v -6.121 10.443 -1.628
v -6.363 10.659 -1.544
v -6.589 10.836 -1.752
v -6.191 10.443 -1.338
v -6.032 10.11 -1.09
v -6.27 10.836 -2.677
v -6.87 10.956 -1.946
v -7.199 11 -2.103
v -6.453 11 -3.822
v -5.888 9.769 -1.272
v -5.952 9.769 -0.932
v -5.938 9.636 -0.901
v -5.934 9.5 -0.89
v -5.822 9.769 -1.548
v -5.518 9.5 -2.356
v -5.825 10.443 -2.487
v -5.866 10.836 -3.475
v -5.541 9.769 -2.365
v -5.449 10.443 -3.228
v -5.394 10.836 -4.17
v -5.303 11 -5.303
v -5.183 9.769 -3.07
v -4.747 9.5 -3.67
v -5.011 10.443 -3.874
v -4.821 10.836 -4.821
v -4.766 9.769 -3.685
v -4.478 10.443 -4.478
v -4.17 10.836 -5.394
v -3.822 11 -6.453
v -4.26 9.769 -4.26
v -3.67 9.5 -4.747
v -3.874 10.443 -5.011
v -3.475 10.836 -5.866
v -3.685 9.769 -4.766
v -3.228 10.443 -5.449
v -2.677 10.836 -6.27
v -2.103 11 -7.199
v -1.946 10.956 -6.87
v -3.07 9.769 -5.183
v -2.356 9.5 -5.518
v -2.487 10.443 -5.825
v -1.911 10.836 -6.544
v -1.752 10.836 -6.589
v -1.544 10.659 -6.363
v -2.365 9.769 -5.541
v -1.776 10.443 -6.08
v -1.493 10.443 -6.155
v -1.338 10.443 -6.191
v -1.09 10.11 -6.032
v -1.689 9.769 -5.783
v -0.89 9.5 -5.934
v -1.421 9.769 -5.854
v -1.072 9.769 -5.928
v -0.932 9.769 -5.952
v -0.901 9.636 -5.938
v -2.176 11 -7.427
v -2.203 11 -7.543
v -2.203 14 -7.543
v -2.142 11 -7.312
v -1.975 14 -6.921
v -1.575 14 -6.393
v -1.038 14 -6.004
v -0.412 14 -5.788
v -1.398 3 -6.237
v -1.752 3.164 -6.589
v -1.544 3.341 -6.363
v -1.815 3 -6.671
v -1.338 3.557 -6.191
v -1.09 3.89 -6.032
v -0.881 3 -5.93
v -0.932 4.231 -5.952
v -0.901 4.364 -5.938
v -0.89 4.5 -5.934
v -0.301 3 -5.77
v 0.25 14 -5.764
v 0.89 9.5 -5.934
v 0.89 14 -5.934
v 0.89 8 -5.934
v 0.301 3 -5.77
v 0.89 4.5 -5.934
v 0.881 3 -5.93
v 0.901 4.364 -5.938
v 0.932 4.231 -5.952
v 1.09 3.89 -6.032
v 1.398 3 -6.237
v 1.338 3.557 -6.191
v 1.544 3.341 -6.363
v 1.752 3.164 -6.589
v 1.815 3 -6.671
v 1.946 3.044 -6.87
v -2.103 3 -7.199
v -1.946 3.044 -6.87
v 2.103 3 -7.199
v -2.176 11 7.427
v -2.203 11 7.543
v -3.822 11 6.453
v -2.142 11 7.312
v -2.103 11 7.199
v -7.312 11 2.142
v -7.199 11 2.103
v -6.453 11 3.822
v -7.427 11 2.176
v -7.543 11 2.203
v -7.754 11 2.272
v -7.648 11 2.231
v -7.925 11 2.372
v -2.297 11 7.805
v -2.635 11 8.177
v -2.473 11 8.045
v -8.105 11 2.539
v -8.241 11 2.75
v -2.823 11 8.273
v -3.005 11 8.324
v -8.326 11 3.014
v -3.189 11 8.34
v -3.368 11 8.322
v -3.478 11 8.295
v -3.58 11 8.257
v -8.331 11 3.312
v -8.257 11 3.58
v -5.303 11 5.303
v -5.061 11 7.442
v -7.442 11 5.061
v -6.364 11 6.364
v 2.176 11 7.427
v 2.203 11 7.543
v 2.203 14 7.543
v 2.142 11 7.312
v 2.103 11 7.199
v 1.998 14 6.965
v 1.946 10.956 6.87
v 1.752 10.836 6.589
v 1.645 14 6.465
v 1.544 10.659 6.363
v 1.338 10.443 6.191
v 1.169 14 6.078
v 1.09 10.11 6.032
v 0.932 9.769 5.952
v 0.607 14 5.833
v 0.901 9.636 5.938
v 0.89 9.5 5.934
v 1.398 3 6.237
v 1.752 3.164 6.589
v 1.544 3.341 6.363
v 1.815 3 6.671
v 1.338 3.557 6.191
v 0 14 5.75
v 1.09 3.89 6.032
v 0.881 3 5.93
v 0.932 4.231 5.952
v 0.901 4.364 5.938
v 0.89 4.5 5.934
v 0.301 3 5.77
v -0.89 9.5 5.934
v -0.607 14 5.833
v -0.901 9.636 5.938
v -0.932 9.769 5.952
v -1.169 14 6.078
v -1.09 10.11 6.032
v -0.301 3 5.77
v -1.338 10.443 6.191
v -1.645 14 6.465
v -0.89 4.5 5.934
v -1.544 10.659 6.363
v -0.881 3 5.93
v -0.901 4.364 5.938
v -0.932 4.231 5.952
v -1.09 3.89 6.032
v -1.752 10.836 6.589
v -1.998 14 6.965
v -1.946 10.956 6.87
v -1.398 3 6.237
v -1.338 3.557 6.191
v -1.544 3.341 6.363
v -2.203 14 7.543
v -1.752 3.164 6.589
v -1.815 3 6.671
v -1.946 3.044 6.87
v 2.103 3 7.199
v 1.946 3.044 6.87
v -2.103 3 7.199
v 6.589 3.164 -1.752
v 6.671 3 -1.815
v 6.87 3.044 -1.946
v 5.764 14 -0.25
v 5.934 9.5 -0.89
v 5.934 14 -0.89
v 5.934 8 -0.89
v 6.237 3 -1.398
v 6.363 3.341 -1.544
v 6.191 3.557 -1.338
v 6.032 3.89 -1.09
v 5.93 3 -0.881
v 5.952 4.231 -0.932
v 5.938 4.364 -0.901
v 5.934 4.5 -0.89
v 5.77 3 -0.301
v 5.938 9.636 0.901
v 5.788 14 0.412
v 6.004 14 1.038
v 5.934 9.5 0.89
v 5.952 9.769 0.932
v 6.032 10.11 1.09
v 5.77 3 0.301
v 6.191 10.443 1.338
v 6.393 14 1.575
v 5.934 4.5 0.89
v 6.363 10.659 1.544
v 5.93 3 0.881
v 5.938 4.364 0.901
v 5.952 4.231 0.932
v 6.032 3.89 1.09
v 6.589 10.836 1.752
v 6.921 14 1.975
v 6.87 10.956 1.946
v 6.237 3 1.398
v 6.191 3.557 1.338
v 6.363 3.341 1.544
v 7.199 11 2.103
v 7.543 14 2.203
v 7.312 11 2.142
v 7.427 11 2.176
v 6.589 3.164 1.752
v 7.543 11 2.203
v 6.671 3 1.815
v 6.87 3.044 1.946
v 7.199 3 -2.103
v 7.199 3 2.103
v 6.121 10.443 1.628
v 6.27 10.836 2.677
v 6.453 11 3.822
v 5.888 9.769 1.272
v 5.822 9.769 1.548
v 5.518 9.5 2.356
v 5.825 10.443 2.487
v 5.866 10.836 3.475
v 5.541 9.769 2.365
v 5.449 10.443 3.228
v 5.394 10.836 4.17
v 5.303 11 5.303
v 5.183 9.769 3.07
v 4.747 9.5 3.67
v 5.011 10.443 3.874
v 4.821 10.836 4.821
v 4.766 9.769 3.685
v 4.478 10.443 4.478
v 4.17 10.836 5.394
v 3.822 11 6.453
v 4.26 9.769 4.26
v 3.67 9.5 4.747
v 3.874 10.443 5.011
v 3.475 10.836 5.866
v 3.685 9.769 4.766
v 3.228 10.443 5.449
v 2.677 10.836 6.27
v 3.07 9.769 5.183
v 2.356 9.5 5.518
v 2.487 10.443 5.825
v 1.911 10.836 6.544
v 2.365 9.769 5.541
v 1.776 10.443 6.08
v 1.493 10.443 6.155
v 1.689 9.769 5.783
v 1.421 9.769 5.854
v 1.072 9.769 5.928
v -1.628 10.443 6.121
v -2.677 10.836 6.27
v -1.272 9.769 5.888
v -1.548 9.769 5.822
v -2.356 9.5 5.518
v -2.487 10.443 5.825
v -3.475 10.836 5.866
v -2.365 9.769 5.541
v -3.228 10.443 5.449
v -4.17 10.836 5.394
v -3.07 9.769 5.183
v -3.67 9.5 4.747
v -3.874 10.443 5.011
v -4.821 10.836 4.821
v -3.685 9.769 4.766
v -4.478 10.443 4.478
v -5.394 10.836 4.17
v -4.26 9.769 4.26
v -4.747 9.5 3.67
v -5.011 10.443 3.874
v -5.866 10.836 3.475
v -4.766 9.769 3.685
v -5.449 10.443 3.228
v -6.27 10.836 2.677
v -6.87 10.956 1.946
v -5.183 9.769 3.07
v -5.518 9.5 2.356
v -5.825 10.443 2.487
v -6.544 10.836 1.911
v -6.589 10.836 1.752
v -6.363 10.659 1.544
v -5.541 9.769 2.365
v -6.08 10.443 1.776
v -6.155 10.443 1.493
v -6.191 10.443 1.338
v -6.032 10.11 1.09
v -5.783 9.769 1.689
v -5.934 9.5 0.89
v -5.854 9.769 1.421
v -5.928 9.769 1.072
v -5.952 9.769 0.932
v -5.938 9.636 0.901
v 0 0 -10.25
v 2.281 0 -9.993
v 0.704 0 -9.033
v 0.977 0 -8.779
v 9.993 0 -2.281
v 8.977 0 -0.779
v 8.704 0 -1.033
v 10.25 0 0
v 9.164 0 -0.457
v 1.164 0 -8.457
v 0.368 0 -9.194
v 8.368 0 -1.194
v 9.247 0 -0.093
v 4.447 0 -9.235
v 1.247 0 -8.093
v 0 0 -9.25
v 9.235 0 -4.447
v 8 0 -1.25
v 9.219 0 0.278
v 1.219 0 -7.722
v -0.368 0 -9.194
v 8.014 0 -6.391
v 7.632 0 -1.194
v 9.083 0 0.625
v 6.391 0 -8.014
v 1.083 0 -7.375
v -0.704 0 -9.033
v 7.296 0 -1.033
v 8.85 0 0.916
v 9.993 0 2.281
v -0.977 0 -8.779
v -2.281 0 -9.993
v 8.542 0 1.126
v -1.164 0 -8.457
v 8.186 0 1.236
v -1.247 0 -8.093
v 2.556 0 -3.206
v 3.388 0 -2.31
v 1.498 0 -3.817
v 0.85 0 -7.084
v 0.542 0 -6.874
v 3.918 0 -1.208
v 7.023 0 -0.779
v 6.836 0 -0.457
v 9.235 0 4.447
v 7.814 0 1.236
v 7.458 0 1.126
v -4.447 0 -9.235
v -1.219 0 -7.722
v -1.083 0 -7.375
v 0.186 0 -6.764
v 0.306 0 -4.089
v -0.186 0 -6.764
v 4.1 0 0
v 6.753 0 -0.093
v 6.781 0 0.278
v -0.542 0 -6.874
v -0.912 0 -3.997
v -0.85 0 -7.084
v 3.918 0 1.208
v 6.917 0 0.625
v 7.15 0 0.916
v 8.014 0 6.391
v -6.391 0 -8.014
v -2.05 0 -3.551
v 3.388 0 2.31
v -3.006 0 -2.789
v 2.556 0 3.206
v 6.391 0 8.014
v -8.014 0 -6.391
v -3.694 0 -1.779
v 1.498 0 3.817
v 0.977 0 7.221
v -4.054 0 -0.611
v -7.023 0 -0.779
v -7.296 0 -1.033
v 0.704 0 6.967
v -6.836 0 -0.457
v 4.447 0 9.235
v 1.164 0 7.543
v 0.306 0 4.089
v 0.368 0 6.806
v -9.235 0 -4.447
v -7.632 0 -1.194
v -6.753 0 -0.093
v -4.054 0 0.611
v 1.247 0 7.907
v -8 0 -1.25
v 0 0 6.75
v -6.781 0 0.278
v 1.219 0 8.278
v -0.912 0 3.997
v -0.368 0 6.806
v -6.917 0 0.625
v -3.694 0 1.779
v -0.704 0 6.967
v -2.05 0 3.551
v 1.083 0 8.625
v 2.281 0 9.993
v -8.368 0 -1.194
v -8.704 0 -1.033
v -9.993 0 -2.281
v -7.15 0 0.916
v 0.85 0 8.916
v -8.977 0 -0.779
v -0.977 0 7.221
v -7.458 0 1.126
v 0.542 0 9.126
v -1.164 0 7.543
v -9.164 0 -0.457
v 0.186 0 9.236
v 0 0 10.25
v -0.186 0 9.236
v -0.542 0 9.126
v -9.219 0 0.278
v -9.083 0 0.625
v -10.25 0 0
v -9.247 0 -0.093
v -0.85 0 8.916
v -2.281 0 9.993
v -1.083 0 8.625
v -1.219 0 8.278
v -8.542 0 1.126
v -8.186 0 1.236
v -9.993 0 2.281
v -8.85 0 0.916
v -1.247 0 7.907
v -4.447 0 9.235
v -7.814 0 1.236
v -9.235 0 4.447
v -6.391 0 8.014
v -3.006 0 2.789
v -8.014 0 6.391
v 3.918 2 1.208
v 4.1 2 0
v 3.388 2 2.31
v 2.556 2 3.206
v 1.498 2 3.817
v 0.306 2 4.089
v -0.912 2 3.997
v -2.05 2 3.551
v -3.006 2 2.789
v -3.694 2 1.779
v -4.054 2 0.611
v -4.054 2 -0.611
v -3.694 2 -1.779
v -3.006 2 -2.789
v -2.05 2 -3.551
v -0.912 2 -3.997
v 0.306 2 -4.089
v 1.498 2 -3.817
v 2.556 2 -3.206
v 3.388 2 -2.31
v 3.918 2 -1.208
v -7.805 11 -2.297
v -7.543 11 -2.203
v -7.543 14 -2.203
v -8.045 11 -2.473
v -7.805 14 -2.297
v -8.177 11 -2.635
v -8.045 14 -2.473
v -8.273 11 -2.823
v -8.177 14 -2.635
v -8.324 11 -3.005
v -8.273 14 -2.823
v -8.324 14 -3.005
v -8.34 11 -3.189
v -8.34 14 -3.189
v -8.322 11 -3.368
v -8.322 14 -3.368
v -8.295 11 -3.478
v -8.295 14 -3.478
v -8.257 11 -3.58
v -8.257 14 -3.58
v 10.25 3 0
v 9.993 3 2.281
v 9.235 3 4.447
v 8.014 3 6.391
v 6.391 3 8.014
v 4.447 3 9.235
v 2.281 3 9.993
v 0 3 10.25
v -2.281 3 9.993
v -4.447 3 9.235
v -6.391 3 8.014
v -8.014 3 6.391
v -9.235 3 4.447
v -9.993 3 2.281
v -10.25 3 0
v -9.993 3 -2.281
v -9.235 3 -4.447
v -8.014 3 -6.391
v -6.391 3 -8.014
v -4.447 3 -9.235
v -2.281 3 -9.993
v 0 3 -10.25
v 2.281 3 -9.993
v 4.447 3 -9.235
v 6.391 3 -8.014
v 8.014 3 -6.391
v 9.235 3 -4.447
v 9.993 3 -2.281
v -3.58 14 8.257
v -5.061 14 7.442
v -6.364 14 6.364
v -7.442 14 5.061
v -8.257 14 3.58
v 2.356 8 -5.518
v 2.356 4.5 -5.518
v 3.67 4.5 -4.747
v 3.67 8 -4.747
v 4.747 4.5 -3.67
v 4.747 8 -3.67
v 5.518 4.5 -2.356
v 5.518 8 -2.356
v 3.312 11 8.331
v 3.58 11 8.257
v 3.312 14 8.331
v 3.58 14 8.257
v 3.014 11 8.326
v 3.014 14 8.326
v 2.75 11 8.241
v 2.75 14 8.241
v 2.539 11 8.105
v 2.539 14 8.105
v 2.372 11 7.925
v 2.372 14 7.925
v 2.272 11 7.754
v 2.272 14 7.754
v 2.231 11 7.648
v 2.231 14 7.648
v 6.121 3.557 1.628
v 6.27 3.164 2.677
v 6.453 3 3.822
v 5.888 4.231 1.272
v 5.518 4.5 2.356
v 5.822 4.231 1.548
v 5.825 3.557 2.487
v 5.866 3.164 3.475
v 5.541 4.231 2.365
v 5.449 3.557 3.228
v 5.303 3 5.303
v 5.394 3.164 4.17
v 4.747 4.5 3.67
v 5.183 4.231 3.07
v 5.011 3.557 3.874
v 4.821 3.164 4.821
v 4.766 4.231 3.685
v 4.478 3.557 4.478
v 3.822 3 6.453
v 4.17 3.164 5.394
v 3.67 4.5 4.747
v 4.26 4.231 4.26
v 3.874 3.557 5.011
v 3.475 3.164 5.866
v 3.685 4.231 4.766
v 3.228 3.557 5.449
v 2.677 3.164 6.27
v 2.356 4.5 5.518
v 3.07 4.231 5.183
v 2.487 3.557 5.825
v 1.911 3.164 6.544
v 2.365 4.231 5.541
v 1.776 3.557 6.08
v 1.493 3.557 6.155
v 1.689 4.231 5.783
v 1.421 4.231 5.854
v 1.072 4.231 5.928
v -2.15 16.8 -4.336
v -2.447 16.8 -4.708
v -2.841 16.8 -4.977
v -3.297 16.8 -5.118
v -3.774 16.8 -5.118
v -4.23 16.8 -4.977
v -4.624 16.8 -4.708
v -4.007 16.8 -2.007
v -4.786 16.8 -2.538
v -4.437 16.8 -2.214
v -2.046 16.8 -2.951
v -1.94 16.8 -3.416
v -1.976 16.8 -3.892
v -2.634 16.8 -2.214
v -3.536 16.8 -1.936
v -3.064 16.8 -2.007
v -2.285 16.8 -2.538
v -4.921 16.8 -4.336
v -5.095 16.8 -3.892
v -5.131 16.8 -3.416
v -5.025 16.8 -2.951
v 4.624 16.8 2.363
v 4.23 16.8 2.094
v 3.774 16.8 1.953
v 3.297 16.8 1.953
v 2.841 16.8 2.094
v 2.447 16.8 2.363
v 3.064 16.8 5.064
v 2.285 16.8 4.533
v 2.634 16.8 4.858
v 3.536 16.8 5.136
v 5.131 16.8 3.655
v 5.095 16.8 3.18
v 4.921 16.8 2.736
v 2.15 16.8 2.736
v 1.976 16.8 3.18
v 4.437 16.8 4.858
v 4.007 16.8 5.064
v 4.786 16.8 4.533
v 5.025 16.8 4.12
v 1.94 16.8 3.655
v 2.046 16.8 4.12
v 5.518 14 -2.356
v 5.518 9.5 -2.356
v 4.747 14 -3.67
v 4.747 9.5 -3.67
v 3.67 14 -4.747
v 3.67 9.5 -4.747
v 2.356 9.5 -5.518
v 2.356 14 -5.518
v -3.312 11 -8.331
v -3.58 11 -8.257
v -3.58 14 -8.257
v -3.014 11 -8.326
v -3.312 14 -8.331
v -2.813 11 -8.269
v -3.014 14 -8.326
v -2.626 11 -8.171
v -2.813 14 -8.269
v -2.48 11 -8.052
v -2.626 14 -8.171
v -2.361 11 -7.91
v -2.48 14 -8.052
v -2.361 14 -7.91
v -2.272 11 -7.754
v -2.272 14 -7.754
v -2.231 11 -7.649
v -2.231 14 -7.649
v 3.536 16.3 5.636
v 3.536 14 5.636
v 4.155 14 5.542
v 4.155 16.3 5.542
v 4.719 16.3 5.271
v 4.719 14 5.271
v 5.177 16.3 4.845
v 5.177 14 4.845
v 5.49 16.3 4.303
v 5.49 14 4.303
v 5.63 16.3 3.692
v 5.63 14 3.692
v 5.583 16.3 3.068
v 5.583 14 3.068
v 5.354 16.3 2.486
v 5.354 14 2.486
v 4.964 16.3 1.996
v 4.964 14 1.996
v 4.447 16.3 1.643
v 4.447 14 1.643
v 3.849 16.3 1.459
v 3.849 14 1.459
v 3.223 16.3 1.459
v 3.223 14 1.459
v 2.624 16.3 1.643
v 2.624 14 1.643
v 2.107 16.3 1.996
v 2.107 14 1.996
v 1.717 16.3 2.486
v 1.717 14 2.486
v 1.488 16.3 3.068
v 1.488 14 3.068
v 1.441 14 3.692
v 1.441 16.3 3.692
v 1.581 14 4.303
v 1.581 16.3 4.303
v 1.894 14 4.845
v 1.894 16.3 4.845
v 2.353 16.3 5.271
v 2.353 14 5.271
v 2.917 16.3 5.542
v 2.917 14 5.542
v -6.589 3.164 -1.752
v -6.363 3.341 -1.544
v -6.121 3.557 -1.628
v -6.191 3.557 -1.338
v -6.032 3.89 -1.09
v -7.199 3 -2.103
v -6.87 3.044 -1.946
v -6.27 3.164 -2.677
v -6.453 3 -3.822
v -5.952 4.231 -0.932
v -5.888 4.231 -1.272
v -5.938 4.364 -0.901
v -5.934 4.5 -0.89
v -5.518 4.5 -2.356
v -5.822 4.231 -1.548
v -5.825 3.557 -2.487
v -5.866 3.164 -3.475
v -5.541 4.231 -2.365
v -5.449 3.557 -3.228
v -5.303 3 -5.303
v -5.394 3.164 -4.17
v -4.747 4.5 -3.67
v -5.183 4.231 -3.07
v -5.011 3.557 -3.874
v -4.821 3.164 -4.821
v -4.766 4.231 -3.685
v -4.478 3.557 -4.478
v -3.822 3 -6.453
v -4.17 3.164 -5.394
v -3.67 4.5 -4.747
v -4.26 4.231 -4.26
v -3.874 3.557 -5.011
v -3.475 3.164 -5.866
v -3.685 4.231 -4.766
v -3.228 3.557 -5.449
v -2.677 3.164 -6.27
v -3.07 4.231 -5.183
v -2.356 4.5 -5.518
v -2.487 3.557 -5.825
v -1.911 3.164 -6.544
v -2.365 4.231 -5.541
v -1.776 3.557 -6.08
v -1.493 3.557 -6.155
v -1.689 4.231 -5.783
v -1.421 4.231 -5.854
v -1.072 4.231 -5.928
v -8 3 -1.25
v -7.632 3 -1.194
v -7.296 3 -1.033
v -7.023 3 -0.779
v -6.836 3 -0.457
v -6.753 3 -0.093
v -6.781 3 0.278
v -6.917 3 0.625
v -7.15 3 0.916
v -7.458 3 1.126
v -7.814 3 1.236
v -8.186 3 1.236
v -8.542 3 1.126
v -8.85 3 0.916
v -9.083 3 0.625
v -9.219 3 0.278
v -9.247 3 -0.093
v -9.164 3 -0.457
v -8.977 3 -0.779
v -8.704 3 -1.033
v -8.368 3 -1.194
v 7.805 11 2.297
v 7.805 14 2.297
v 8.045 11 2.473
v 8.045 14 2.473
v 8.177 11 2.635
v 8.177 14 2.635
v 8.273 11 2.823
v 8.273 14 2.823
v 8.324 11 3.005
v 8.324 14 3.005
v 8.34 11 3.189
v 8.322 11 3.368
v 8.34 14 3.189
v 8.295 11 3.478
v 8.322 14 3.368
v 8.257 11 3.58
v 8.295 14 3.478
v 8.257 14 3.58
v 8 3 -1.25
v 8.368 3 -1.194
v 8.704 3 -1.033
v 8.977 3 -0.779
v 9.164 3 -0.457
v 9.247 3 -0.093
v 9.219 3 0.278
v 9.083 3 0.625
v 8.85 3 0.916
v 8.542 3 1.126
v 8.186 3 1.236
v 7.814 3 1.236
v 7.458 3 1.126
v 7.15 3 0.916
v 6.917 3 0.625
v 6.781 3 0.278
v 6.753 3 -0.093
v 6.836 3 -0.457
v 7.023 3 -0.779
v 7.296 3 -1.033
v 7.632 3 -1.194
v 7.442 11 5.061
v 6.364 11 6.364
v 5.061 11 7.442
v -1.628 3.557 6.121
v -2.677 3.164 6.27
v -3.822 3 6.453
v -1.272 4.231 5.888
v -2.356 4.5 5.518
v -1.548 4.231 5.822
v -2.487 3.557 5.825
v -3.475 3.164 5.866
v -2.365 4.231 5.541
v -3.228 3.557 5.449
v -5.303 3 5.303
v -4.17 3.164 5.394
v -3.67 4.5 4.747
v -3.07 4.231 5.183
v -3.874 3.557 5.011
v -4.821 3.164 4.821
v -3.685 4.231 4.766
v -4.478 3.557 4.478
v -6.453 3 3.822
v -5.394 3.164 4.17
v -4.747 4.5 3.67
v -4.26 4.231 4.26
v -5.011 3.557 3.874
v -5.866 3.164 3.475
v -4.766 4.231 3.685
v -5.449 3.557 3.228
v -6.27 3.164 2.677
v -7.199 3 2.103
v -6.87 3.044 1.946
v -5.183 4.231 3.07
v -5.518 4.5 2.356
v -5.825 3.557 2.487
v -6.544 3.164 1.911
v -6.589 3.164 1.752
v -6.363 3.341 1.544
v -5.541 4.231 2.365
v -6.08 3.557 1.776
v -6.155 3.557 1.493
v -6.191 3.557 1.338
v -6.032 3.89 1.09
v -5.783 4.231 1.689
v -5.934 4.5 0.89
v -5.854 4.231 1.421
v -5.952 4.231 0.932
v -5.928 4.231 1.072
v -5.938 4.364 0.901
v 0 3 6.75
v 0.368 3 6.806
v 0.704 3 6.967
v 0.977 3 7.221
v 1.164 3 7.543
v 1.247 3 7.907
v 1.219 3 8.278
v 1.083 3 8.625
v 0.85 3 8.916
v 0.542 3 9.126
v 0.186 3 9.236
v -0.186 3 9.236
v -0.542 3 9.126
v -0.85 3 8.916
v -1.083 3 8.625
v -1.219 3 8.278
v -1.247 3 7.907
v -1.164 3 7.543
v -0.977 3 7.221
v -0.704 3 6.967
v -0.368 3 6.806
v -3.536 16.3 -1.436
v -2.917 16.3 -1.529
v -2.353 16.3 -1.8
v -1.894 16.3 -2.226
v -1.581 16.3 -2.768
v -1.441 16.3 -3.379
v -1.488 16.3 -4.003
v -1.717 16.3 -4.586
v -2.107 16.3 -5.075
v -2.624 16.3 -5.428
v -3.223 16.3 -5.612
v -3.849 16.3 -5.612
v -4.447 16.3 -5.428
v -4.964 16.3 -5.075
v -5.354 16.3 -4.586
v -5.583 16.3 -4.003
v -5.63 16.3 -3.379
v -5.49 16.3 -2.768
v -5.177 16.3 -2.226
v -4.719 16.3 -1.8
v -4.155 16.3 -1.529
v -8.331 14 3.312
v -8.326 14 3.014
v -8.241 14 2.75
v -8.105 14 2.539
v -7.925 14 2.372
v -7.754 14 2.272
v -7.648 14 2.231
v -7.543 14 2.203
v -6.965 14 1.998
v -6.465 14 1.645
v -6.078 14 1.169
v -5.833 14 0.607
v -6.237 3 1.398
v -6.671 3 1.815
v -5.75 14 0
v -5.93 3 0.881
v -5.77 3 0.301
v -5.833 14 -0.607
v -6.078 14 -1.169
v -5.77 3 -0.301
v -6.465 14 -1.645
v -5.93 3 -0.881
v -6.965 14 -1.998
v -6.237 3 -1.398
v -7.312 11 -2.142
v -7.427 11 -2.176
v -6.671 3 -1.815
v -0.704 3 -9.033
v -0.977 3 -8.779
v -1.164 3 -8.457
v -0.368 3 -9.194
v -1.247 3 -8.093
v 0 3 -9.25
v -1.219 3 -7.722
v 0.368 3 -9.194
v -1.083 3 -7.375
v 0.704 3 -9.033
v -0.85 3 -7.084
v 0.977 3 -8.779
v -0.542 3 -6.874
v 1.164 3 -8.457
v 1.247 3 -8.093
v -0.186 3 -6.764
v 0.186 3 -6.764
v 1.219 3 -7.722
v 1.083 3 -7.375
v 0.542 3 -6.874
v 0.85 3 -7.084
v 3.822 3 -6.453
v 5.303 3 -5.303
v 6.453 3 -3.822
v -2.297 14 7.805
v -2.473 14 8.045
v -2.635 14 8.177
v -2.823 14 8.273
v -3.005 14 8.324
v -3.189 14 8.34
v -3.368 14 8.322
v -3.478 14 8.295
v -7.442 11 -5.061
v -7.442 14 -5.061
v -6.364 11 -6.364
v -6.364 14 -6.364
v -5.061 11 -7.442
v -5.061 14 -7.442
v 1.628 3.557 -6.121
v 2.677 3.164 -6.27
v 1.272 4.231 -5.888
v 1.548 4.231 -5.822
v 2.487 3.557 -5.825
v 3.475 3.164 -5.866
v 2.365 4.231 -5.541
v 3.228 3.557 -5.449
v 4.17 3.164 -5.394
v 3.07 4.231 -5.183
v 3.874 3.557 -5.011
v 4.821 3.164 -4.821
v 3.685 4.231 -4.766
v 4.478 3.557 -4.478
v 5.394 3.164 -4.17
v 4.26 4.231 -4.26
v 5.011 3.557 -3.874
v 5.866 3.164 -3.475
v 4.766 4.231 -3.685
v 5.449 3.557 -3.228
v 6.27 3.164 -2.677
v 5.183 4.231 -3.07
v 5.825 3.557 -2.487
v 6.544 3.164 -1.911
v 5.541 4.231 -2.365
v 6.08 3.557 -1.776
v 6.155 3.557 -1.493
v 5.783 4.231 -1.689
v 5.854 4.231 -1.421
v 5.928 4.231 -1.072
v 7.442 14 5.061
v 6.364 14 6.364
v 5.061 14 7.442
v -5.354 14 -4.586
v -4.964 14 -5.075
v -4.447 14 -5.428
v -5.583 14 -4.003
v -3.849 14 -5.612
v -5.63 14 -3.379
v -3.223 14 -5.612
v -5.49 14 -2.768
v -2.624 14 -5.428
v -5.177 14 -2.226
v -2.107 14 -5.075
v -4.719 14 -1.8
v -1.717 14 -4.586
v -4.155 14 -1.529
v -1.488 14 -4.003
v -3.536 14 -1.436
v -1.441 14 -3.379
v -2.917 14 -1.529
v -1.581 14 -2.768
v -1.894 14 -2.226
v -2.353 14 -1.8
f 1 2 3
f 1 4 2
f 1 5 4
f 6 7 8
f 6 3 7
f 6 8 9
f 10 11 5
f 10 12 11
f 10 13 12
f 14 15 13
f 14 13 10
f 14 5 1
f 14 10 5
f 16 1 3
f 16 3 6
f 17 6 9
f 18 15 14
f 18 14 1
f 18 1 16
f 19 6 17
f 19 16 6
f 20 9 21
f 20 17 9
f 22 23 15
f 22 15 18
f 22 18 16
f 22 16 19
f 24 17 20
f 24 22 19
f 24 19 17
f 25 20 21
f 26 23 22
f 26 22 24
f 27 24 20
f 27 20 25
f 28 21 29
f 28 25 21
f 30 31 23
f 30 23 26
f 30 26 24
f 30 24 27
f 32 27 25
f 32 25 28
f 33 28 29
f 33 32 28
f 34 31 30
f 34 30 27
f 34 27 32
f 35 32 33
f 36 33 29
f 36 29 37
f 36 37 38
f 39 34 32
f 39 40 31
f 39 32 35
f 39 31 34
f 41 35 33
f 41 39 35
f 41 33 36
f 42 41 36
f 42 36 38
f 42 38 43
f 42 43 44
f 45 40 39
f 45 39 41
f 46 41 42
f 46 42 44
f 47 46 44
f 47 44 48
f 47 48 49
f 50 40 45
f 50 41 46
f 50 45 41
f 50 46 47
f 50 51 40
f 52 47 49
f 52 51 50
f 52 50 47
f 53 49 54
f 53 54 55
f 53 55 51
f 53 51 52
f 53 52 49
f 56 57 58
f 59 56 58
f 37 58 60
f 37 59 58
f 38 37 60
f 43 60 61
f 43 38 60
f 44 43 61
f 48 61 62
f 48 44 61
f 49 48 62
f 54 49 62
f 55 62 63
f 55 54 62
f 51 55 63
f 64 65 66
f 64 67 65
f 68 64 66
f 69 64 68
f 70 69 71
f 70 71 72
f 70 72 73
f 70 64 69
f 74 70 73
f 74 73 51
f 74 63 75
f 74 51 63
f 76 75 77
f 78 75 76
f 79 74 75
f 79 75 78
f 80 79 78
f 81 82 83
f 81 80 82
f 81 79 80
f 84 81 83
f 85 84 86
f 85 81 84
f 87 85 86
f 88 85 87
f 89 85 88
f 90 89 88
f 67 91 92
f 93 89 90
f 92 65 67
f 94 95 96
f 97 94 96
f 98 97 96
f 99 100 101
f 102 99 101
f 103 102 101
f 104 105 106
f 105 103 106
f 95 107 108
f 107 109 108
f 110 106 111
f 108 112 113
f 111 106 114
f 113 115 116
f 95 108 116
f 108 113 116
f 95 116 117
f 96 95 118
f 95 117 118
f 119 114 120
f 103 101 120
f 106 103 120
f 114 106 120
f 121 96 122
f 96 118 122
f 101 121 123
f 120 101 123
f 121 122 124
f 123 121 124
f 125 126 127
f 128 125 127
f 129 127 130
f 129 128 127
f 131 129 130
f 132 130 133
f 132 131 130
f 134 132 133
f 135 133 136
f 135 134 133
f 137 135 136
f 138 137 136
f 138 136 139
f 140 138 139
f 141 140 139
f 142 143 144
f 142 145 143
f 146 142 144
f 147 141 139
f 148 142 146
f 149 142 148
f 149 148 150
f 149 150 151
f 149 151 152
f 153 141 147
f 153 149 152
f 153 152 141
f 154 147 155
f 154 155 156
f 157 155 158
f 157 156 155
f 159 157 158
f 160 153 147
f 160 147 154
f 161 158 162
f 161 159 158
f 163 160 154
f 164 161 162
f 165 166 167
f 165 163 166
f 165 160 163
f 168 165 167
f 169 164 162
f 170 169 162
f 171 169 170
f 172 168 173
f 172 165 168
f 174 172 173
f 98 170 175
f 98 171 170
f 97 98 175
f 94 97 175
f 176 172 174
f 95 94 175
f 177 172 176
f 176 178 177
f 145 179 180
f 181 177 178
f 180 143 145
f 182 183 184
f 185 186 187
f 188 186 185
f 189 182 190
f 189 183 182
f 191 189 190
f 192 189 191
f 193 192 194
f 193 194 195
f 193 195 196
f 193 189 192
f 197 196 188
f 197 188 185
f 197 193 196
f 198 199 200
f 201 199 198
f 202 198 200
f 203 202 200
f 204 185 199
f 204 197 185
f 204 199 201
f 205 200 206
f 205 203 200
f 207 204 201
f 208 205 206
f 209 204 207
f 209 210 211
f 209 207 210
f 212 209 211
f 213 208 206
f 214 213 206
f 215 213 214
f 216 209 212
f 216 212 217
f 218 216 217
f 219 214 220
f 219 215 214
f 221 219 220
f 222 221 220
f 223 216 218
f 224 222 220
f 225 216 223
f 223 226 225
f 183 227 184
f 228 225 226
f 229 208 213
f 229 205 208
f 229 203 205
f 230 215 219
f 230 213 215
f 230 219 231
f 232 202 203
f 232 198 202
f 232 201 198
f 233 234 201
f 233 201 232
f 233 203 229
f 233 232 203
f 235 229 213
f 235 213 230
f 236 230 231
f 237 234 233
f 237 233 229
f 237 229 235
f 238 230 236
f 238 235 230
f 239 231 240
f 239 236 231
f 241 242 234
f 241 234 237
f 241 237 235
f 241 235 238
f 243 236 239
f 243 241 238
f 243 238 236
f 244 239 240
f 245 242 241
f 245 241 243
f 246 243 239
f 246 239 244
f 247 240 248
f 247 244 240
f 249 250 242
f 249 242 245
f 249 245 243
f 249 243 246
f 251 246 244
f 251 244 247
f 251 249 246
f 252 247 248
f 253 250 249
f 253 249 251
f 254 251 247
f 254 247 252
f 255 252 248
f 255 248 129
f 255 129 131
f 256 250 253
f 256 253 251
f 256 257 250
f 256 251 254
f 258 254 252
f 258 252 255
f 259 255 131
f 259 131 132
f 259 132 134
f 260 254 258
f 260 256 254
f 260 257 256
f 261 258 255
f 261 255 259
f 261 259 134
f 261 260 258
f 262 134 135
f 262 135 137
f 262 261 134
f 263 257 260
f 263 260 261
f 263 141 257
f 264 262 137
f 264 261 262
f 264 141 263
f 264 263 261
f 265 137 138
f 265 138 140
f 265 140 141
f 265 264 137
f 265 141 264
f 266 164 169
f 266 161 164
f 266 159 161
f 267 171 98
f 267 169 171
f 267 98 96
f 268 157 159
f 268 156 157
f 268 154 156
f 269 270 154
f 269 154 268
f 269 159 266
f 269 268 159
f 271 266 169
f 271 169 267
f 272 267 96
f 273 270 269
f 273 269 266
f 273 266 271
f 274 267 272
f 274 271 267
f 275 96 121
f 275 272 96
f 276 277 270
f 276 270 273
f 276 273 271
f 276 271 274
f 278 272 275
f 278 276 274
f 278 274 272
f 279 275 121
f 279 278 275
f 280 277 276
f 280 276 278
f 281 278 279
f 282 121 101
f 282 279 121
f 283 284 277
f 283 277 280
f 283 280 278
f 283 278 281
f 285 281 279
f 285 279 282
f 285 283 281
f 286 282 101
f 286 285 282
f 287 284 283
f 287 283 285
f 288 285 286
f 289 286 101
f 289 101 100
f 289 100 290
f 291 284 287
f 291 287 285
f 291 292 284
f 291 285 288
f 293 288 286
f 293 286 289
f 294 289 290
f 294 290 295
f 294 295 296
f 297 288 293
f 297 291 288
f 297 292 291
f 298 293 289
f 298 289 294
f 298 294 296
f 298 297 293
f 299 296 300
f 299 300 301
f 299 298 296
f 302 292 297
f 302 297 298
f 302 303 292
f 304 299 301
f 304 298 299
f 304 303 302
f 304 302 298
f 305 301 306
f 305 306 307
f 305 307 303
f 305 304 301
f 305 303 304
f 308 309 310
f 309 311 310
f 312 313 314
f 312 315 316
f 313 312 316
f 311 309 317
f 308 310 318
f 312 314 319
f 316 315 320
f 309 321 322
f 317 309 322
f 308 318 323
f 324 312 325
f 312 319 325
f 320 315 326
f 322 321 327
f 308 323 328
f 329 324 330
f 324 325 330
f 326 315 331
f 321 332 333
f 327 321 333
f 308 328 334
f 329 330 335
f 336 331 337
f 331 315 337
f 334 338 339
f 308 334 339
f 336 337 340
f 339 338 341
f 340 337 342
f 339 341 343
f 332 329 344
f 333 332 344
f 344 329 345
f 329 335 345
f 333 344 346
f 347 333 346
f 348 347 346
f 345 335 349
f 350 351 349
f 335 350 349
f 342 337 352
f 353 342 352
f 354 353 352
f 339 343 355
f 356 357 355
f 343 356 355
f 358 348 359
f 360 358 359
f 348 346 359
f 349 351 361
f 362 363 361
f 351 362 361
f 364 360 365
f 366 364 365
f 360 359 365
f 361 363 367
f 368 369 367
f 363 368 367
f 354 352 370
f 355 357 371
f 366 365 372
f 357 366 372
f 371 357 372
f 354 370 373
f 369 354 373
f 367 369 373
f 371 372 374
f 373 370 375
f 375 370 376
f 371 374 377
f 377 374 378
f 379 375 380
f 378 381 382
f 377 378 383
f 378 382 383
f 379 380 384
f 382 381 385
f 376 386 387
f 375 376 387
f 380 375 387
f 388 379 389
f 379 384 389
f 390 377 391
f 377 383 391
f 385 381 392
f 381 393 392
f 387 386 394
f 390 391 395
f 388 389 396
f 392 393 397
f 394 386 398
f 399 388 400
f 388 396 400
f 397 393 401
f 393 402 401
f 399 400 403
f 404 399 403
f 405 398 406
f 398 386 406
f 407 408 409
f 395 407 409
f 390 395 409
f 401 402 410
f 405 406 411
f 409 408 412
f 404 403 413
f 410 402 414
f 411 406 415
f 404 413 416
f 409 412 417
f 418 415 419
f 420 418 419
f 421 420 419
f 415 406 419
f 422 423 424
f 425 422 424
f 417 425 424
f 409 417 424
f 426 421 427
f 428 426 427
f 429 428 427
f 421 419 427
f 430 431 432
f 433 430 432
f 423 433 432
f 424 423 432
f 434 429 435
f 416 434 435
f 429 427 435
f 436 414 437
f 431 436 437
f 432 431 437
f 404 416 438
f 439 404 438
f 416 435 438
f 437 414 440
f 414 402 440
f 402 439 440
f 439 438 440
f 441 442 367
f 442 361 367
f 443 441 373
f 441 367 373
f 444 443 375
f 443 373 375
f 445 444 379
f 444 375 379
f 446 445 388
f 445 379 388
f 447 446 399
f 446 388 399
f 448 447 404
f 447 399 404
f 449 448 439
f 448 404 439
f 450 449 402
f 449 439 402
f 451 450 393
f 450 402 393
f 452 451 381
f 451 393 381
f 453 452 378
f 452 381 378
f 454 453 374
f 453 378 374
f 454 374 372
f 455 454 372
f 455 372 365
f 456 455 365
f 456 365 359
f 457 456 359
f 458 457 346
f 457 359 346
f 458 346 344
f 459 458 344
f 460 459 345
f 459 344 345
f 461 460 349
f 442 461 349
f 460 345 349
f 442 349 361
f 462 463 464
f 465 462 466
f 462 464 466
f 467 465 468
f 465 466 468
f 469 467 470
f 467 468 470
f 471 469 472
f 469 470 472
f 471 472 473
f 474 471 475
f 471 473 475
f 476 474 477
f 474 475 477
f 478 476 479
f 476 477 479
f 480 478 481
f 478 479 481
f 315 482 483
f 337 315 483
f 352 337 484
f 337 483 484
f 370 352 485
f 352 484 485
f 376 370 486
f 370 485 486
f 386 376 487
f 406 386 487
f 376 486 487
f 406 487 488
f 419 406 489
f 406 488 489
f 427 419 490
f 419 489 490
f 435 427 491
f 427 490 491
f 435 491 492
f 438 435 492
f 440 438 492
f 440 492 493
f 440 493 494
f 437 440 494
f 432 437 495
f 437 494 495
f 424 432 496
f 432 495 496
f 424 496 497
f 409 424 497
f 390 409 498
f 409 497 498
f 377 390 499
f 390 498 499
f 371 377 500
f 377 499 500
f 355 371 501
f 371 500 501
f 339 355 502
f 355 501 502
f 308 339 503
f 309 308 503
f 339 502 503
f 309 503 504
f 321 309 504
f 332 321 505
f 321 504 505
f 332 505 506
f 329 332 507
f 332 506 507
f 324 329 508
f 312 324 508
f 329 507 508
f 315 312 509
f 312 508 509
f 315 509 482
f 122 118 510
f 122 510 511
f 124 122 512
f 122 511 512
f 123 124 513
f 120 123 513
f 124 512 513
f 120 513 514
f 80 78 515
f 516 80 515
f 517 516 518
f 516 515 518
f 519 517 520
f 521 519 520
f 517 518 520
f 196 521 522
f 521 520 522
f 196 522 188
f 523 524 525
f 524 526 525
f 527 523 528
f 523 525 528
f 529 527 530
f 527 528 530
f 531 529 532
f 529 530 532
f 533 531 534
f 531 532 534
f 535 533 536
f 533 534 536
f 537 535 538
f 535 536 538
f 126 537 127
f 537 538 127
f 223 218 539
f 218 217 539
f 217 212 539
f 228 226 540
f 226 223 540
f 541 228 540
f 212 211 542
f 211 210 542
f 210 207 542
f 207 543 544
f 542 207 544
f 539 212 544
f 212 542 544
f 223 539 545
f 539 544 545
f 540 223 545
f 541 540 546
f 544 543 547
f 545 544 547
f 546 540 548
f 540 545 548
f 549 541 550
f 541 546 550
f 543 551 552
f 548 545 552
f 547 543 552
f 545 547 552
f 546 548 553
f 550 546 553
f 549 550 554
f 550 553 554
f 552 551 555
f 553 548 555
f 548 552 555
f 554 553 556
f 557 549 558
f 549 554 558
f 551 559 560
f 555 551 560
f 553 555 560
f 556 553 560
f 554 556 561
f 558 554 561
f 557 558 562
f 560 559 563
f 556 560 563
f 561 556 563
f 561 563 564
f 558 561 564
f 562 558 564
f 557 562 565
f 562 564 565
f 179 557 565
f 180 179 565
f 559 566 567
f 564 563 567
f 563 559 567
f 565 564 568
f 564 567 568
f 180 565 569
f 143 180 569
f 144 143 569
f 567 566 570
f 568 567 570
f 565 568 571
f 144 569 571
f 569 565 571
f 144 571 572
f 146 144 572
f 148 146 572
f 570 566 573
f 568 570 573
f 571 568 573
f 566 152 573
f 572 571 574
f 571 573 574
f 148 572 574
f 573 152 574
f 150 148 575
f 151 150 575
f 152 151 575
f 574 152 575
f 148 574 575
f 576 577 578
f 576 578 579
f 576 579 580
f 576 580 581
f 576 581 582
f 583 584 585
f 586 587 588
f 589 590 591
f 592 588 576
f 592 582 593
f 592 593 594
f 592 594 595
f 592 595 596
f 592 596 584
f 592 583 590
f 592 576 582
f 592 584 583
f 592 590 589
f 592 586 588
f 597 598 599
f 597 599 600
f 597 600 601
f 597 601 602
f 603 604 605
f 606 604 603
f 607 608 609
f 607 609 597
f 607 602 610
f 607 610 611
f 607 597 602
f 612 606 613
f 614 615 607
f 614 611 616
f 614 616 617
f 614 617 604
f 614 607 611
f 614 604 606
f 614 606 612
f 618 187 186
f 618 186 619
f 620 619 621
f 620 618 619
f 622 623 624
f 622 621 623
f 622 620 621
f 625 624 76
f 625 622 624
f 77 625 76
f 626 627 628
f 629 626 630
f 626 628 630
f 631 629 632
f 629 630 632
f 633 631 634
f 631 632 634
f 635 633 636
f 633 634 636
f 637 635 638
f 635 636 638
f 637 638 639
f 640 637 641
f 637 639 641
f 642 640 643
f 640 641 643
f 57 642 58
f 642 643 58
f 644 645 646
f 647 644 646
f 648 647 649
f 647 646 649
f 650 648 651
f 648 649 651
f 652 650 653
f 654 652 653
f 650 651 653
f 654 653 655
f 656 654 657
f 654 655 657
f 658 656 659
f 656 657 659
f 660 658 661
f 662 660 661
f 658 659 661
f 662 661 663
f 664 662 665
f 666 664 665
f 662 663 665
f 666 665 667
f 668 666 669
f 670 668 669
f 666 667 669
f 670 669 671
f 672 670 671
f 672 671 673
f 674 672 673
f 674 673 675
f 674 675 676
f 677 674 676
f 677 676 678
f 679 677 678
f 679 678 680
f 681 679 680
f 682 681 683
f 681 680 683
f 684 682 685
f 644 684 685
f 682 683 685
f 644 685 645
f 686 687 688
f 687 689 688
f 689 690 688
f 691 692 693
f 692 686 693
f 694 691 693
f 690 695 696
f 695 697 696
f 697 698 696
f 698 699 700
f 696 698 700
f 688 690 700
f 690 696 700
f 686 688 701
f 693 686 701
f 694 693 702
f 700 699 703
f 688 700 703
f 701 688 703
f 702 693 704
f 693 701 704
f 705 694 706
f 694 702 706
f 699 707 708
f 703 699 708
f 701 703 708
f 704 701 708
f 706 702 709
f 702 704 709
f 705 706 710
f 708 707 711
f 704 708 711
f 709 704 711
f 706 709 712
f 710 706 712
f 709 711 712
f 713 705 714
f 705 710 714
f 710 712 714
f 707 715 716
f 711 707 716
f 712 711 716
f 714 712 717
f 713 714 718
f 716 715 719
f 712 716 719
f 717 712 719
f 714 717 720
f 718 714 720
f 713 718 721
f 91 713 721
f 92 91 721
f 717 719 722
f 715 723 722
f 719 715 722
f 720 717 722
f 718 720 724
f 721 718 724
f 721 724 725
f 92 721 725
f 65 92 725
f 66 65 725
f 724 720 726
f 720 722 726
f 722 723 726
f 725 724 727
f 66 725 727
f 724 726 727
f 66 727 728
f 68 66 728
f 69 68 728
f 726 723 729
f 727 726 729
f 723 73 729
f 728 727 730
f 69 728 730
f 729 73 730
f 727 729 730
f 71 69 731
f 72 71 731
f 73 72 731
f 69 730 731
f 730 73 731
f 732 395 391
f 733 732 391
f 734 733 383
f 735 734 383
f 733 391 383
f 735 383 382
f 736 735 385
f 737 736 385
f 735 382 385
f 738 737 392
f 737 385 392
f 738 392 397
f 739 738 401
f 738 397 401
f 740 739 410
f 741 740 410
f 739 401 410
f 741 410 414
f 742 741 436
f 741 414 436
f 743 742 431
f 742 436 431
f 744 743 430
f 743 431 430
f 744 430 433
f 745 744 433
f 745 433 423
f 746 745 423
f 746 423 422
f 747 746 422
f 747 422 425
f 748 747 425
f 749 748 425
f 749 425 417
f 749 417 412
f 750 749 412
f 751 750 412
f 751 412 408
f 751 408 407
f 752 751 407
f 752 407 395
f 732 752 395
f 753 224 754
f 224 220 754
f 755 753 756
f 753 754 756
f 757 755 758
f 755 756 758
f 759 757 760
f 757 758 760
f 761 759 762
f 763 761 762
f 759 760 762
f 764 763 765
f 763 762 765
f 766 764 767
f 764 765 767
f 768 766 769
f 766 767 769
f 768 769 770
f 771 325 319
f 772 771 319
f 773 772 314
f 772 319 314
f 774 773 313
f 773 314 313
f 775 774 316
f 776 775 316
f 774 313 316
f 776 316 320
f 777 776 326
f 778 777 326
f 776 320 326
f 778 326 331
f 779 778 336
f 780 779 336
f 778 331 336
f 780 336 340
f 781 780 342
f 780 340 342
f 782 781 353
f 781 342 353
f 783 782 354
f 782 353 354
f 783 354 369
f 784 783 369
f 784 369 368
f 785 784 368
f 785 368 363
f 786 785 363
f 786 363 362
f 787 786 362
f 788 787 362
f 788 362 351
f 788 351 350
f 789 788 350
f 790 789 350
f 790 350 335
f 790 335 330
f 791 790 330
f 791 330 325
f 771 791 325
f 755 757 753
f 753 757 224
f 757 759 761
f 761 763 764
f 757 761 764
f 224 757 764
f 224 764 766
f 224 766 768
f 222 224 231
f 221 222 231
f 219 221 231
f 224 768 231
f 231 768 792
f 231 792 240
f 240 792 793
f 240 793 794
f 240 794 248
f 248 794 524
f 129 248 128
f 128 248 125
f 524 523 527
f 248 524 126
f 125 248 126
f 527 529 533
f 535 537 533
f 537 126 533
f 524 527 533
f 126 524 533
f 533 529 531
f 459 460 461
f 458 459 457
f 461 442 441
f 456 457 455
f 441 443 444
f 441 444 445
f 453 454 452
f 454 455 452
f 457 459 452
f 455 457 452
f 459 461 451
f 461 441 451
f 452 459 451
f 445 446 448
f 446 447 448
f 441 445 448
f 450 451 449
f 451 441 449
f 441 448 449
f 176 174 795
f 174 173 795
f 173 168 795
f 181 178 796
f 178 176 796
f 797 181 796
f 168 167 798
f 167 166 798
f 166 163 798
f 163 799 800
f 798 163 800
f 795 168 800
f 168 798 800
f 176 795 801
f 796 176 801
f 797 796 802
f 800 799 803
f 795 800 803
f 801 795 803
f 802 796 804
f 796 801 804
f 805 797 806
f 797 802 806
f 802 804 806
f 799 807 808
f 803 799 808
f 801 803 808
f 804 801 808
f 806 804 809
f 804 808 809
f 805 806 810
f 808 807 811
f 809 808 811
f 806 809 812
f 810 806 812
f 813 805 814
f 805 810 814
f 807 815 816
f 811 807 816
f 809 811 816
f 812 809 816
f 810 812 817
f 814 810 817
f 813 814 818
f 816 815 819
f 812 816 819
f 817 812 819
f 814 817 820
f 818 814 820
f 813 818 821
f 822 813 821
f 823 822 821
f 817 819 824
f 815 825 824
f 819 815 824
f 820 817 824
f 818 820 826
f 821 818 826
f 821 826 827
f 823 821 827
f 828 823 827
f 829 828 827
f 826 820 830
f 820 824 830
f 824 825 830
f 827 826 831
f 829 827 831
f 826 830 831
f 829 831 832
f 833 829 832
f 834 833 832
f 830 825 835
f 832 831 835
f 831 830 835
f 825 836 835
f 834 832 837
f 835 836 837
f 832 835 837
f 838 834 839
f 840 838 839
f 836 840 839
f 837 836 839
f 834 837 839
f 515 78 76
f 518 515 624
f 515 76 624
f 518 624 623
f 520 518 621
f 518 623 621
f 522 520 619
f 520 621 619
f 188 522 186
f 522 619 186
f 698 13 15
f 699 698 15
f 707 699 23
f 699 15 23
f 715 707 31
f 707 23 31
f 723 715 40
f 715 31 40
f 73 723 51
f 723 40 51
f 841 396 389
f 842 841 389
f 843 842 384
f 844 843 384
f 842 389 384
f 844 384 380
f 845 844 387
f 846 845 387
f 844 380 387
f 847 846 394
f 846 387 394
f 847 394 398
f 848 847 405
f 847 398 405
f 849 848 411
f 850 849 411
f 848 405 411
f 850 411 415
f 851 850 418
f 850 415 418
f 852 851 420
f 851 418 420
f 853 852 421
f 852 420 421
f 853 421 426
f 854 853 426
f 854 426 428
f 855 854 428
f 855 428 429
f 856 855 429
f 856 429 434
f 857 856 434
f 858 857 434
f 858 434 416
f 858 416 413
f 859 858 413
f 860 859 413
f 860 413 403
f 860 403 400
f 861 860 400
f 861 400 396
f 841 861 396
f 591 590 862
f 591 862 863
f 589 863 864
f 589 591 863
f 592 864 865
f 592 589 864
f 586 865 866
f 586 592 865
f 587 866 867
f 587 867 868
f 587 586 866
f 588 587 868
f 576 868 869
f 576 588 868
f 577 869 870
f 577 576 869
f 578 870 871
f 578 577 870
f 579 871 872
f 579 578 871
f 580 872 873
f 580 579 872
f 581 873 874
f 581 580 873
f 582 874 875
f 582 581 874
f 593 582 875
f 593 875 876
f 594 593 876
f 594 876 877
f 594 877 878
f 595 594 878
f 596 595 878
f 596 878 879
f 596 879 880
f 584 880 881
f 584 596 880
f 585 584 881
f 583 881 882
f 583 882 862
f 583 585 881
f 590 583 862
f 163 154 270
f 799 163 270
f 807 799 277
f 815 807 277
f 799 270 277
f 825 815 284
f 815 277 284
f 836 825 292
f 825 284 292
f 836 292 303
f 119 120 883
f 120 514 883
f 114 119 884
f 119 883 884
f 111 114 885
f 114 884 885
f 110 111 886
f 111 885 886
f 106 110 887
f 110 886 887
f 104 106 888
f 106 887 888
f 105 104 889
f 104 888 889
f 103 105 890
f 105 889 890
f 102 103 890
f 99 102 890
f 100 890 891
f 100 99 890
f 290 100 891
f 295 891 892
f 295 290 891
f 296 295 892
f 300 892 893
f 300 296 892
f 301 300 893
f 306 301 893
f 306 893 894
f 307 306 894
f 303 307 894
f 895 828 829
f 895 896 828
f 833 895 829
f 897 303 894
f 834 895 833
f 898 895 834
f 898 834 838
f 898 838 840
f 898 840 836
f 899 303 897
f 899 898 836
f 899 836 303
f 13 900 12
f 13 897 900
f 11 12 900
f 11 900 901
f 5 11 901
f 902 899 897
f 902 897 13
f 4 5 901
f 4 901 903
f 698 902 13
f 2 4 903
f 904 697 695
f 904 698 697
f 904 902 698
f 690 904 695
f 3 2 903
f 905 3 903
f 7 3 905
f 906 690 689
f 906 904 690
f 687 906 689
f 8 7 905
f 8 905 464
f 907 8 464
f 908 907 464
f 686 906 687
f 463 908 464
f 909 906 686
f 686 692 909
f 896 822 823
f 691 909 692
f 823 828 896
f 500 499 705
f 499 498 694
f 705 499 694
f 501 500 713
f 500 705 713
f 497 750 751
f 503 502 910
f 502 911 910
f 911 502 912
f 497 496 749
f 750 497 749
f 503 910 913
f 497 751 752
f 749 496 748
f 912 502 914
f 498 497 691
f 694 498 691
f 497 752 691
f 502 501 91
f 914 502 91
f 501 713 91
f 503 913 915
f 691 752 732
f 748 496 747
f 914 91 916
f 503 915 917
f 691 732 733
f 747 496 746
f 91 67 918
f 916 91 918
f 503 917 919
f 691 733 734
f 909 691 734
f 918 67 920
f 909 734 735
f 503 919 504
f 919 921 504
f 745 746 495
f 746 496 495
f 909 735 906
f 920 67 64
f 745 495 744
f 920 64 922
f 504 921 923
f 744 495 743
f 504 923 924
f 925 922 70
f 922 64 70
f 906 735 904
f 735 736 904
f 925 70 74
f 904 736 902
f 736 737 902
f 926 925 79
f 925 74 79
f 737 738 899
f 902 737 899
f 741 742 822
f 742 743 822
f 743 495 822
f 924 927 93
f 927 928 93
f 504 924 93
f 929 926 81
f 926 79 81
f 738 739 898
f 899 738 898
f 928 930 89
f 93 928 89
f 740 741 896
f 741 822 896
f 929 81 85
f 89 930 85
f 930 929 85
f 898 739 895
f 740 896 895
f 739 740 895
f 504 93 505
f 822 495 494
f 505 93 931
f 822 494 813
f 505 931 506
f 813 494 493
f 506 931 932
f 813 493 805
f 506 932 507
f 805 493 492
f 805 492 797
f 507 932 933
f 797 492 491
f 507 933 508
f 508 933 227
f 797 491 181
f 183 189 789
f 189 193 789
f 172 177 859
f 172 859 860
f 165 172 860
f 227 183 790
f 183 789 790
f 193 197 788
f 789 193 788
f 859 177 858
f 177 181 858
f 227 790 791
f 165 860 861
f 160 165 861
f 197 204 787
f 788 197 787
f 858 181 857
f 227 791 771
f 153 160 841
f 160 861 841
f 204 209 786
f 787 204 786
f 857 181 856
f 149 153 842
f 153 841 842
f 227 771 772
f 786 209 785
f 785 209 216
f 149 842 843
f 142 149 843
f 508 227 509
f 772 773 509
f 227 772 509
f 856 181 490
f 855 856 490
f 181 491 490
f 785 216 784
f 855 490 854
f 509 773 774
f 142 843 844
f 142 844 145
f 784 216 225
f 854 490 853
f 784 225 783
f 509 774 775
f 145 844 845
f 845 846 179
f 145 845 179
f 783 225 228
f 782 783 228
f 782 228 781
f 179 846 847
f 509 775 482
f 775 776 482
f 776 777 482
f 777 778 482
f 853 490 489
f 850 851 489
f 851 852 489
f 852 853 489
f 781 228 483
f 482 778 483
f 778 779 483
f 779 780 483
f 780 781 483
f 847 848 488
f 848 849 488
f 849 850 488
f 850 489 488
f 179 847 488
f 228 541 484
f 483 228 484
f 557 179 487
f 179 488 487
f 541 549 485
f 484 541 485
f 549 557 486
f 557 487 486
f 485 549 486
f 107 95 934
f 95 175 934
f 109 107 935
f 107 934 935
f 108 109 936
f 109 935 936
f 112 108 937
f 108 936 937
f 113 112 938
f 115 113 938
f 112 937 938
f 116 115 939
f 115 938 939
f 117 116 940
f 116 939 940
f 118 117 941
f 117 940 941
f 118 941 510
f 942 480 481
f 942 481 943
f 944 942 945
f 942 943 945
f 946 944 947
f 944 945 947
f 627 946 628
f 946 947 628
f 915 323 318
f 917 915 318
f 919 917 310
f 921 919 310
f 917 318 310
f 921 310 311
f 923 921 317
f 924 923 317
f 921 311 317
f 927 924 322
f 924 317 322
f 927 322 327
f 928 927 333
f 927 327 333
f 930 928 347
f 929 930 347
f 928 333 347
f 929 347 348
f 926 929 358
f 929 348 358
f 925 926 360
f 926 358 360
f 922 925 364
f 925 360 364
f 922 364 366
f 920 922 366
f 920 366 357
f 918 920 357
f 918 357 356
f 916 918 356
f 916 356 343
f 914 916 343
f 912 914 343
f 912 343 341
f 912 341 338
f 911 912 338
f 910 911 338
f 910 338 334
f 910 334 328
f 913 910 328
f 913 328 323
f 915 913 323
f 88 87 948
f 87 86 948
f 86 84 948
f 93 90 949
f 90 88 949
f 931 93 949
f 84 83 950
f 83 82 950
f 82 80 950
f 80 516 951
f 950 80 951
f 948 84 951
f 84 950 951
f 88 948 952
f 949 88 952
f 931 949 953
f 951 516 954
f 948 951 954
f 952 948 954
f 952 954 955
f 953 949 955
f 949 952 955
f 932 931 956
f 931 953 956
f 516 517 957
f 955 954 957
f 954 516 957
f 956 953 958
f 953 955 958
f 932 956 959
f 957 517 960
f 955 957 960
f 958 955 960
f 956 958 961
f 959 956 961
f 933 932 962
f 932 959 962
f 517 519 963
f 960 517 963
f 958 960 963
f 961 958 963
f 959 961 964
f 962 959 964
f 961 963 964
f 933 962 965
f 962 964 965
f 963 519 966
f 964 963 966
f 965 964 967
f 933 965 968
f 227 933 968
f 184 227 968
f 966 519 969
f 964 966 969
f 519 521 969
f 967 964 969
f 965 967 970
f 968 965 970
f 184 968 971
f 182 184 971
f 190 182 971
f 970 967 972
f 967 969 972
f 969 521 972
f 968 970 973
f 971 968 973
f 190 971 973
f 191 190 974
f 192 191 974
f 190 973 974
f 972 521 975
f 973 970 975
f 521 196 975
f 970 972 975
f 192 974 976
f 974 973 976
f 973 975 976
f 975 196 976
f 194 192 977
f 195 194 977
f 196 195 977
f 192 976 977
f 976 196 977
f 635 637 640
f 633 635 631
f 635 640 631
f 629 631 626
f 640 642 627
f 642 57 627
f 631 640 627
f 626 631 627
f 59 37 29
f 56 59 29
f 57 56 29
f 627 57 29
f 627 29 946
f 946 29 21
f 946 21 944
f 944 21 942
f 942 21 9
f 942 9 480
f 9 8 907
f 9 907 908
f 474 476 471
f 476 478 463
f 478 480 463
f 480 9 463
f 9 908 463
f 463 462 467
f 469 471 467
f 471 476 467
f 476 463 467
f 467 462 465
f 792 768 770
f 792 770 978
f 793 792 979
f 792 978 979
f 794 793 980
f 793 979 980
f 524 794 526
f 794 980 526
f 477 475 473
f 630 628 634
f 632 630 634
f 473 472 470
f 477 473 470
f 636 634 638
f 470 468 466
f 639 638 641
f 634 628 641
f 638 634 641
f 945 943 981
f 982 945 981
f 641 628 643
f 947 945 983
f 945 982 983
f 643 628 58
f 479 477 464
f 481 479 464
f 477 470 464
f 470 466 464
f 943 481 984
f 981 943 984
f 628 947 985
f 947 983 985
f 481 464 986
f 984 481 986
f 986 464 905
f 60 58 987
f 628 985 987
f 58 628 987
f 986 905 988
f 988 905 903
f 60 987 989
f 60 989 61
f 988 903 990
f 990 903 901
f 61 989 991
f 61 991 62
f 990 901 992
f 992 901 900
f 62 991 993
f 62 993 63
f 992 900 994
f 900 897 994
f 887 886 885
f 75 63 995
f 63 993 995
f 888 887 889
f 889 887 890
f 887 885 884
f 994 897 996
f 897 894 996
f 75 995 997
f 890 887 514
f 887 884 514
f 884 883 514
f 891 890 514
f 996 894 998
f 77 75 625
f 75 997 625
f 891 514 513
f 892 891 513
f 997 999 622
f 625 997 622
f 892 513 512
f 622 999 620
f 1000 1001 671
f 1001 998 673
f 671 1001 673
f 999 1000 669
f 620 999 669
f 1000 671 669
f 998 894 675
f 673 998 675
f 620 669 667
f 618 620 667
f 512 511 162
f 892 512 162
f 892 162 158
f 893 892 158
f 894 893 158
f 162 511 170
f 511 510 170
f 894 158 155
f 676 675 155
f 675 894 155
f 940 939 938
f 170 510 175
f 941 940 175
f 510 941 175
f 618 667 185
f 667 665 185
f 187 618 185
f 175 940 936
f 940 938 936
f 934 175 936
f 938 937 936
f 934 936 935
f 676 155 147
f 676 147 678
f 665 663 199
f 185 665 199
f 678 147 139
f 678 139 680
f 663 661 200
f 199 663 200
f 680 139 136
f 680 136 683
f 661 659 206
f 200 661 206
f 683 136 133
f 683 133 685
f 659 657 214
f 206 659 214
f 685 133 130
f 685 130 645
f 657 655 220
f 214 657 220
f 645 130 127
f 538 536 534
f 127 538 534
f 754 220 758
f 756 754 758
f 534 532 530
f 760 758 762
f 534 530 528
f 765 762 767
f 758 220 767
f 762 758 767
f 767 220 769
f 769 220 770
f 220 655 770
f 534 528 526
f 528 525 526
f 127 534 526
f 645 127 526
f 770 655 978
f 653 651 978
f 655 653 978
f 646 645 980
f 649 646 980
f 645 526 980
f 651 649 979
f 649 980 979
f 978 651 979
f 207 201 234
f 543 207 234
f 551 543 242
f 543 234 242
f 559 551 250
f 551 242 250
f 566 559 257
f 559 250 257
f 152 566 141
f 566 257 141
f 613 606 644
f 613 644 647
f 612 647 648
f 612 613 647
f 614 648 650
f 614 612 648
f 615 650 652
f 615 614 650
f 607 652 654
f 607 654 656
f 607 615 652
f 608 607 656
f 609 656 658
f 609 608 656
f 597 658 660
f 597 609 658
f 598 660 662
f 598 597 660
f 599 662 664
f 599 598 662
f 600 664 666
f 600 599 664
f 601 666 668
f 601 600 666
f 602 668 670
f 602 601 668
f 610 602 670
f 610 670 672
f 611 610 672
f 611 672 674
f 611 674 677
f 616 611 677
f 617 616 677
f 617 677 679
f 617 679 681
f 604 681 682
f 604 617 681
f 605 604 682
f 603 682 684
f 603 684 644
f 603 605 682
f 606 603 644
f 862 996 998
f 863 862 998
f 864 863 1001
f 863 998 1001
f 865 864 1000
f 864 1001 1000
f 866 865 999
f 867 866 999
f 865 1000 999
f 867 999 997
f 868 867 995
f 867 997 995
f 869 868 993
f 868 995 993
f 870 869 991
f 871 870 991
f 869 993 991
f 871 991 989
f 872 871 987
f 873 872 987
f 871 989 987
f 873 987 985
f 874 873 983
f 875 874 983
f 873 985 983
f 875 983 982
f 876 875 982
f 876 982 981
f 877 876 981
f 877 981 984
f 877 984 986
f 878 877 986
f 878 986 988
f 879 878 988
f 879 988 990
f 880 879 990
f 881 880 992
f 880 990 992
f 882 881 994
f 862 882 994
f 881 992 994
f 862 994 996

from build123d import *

# Parameters (mm, degrees)
SKETCH3_R           = 1.25
CUT_EXTRUDE1_DEPTH  = 21.152543264
SKETCH4_R           = 2.1
BOSS_EXTRUDE1_DEPTH = 2.8
SKETCH5_R           = 2.25
SKETCH5_R_2         = 1.25
CUT_EXTRUDE2_DEPTH  = 21.014120016
FILLET1_R           = 1.5
CHAMFER1_SIZE       = 0.5
FILLET2_R           = 1
CUT_EXTRUDE3_DEPTH  = 6


with BuildPart() as part:
    # Sketch2 → Revolve2 (revolve)
    with BuildSketch(Plane.XY):
        Polygon((4.1, 2), (4.1, 0), (10.25, 0), (10.25, 3), (6, 3), (6, 11), (9, 11), (9, 14), (0, 14), (0, 2), align=None)
    revolve(axis=Axis((0, 14, 0), (0, -1, 0)))

    # Sketch3 → Cut-Extrude1 (cut, through all)
    with BuildSketch(Plane.XZ):
        with Locations(Location((0, 8, 0), (0, 0, 270))):
            Circle(SKETCH3_R)
        with Locations(Location((8, 0, 0), (0, 0, 270))):
            Circle(SKETCH3_R)
        with Locations(Location((0, -8, 0), (0, 0, 270))):
            Circle(SKETCH3_R)
        with Locations(Location((-8, 0, 0), (0, 0, 270))):
            Circle(SKETCH3_R)
    extrude(amount=-CUT_EXTRUDE1_DEPTH, mode=Mode.SUBTRACT)

    # Sketch4 → Boss-Extrude1 (add)
    with BuildSketch(Plane(origin=(0, 14, 0), x_dir=(1, 0, 0), z_dir=(0, 1, 0))):
        with Locations(Location((-3.535533906, 3.535533906, 0), (0, 0, 270))):
            Circle(SKETCH4_R)
        with Locations(Location((3.535533906, -3.535533906, 0), (0, 0, 270))):
            Circle(SKETCH4_R)
    extrude(amount=BOSS_EXTRUDE1_DEPTH)

    # Sketch5 → Cut-Extrude2 (cut, through all)
    # profile 1 of 4: a face of its own
    with BuildSketch(Plane(origin=(0, 3, 0), x_dir=(1, 0, 0), z_dir=(0, 1, 0))):
        with Locations((0, -8)):
            Circle(SKETCH5_R)
        with Locations(Location((0, -8, 0), (0, 0, 90))):
            Circle(SKETCH5_R_2, mode=Mode.SUBTRACT)
    # profile 2 of 4: a face of its own
    with BuildSketch(Plane(origin=(0, 3, 0), x_dir=(1, 0, 0), z_dir=(0, 1, 0))):
        with Locations((-8, 0)):
            Circle(SKETCH5_R)
        with Locations(Location((-8, 0, 0), (0, 0, 90))):
            Circle(SKETCH5_R_2, mode=Mode.SUBTRACT)
    # profile 3 of 4: a face of its own
    with BuildSketch(Plane(origin=(0, 3, 0), x_dir=(1, 0, 0), z_dir=(0, 1, 0))):
        with Locations((0, 8)):
            Circle(SKETCH5_R)
        with Locations(Location((0, 8, 0), (0, 0, 90))):
            Circle(SKETCH5_R_2, mode=Mode.SUBTRACT)
    # profile 4 of 4: a face of its own
    with BuildSketch(Plane(origin=(0, 3, 0), x_dir=(1, 0, 0), z_dir=(0, 1, 0))):
        with Locations((8, 0)):
            Circle(SKETCH5_R)
        with Locations(Location((8, 0, 0), (0, 0, 90))):
            Circle(SKETCH5_R_2, mode=Mode.SUBTRACT)
    extrude(amount=CUT_EXTRUDE2_DEPTH, mode=Mode.SUBTRACT)

    # Fillet1
    fillet1_edges = [part.edges().sort_by_distance(p)[0] for p in [
        (4.242640687, 11, 4.242640687),
        (4.242640687, 3, 4.242640687),
        (-4.242640687, 11, 4.242640687),
        (-4.242640687, 11, -4.242640687),
        (4.242640687, 11, -4.242640687),
        (-4.242640687, 3, 4.242640687),
        (-4.242640687, 3, -4.242640687),
        (4.242640687, 3, -4.242640687),
    ]]
    fillet(fillet1_edges, radius=FILLET1_R)

    # Chamfer1
    chamfer1_edges = [part.edges().sort_by_distance(p)[0] for p in [
        (-3.535533906, 16.8, -5.635533906),
        (3.535533906, 16.8, 1.435533906),
    ]]
    chamfer(chamfer1_edges, length=CHAMFER1_SIZE)

    # Fillet2
    fillet2_edges = [part.edges().sort_by_distance(p)[0] for p in [
        (-2.122697368, 12.5, 8.74609375),
        (2.122697368, 12.5, 8.74609375),
        (-8.74609375, 12.5, -2.122697368),
        (-8.74609375, 12.5, 2.122697368),
        (2.122697368, 12.5, -8.74609375),
        (-2.122697368, 12.5, -8.74609375),
        (8.74609375, 12.5, 2.122697368),
        (8.74609375, 12.5, -2.122697368),
    ]]
    fillet(fillet2_edges, radius=FILLET2_R)

    # Sketch6 → Cut-Extrude3 (cut)
    with BuildSketch(Plane(origin=(0, 14, 0), x_dir=(1, 0, 0), z_dir=(0, 1, 0))):
        with BuildLine():
            Line((0.89020515, 5.93359375), (0.89020515, 14.456034247))
            Line((0.89020515, 14.456034247), (13.499051384, 10.673985998))
            Line((13.499051384, 10.673985998), (14.247339916, 0.89020515))
            Line((14.247339916, 0.89020515), (5.93359375, 0.89020515))
            ThreePointArc((5.93359375, 0.89020515), (4.242640687, 4.242640687), (0.89020515, 5.93359375))
        make_face()
    extrude(amount=-CUT_EXTRUDE3_DEPTH, mode=Mode.SUBTRACT)


solid = part.part
